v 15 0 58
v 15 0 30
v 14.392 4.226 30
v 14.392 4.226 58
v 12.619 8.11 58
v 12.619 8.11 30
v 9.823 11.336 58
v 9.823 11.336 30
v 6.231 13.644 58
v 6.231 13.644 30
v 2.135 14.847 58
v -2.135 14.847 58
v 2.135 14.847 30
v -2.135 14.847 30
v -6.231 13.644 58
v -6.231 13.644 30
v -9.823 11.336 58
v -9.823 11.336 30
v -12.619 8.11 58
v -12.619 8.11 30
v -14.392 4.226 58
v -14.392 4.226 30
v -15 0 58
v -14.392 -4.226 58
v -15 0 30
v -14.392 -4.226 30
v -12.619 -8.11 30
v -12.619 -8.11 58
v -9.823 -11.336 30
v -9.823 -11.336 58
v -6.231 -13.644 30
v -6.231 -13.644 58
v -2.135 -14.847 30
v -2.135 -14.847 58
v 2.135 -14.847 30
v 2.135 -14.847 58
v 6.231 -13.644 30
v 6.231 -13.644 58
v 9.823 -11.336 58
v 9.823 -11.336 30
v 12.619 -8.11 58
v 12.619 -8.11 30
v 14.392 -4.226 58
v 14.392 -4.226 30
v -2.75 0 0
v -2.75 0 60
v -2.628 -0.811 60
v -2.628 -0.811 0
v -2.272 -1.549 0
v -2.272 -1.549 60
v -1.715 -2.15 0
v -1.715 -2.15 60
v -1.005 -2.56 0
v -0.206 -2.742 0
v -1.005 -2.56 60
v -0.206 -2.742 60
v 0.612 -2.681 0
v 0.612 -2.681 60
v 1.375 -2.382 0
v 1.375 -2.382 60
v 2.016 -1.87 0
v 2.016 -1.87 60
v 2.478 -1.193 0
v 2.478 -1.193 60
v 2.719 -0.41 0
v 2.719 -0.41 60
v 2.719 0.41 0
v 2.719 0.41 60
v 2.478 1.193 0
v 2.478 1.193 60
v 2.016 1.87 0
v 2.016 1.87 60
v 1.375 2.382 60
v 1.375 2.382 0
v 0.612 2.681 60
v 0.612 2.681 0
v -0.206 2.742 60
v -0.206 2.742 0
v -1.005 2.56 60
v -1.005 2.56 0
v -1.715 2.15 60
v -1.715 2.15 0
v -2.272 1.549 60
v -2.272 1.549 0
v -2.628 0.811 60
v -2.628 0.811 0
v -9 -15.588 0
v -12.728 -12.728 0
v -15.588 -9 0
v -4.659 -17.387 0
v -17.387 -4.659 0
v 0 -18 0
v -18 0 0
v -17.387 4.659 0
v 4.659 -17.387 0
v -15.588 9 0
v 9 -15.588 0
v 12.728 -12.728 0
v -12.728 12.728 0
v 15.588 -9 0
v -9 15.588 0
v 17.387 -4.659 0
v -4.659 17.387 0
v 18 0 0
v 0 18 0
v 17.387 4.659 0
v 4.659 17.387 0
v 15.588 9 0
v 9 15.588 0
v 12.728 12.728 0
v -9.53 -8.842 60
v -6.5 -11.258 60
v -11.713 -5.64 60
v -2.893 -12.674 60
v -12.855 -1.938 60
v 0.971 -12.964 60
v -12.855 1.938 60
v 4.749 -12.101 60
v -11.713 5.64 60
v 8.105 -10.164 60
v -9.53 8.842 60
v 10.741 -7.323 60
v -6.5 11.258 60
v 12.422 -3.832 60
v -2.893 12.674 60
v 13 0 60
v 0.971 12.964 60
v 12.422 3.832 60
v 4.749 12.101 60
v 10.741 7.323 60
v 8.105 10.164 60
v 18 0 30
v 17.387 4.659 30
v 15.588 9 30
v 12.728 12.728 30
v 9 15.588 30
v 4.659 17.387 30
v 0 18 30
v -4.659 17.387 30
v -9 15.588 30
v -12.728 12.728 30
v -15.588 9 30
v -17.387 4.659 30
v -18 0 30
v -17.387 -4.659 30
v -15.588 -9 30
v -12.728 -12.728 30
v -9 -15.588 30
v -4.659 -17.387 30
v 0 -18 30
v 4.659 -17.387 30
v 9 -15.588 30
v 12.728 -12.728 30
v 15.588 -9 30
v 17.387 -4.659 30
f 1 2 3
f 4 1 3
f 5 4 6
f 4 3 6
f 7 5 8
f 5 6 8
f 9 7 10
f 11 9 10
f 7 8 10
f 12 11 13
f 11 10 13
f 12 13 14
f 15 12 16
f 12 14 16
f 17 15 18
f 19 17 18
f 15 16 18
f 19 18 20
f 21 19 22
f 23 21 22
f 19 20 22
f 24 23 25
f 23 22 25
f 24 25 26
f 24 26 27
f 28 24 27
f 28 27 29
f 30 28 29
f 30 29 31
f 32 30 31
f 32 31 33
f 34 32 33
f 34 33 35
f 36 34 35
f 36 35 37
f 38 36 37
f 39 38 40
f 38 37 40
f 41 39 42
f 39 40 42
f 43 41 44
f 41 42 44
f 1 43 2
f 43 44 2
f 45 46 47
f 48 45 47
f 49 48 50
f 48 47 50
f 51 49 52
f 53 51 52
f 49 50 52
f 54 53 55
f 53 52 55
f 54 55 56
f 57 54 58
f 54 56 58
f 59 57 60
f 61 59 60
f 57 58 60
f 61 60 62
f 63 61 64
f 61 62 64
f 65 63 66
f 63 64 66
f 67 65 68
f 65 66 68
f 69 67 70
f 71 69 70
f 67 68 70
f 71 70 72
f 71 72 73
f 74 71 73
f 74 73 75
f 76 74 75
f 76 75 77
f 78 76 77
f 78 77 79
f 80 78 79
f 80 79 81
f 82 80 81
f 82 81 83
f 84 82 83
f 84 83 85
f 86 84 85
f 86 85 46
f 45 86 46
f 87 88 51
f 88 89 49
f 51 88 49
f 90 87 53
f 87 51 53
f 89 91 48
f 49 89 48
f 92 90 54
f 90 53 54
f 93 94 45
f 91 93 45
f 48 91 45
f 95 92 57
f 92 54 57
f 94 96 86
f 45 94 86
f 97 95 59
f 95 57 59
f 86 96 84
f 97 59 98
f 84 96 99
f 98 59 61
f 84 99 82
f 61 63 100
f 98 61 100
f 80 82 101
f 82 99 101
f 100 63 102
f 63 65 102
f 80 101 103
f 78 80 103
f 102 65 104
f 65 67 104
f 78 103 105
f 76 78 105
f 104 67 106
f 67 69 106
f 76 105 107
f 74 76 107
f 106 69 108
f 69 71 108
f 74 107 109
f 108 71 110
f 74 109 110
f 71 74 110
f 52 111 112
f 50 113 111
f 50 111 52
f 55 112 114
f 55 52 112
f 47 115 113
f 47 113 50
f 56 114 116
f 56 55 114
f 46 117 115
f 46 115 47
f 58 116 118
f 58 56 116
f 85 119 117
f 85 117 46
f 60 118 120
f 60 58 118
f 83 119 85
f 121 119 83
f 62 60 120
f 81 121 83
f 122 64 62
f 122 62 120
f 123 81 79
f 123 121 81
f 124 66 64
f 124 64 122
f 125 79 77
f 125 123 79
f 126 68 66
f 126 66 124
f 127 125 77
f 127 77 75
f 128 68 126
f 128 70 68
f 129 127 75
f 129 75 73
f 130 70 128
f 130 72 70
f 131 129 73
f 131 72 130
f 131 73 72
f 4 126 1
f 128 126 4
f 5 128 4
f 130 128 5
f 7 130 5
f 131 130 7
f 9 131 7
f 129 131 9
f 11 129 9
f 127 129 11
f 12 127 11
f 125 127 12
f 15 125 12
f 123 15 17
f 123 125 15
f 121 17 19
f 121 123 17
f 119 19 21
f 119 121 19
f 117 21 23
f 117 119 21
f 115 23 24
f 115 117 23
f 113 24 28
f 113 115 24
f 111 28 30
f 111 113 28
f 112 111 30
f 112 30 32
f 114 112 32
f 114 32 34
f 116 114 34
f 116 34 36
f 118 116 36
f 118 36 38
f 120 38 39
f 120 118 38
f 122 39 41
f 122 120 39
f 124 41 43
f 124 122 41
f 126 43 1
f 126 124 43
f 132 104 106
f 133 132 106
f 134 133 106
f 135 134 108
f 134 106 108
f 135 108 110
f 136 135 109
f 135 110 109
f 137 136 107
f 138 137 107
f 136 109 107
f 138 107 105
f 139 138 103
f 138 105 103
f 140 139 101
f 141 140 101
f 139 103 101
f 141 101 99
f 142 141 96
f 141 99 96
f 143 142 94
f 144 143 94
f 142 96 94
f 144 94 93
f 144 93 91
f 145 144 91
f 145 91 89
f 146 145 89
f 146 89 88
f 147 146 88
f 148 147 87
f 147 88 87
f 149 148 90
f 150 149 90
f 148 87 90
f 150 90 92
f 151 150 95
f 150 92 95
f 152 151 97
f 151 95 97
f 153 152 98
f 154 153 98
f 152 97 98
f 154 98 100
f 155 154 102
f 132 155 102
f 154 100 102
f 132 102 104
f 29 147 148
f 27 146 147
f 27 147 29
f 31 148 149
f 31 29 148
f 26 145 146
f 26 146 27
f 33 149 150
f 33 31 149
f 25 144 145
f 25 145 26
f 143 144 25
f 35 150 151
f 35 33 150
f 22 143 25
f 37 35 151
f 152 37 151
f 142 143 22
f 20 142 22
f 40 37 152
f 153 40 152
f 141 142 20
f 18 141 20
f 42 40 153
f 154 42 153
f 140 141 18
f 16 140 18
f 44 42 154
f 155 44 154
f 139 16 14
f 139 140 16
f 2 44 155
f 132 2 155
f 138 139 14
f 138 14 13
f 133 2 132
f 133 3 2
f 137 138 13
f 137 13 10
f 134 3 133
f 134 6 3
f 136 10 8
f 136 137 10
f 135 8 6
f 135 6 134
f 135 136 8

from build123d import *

# Parameters (mm, degrees)
F0_R     = 18
F1_DEPTH = 30
F2_R     = 15
F3_DEPTH = 30
F5_D     = 5.5
F6_SIZE  = 2


with BuildPart() as f1:
    # F0 (on Top) → F1 (new body)
    with BuildSketch(Plane.XY):
        Circle(F0_R)
    extrude(amount=F1_DEPTH)

    # F2 (on face) → F3 (join)
    with BuildSketch(Plane.XY.offset(30)):
        Circle(F2_R)
    extrude(amount=F3_DEPTH)

    # F5 (through all)
    with Locations(Plane(origin=(0, 0, 0), x_dir=(1, 0, 0), z_dir=(0, 0, -1))):
        with Locations((0, 0)):
            Hole(F5_D / 2)

    # F6
    f6_edges = [f1.edges().sort_by_distance(p)[0] for p in [
        (-15, 0, 60),
    ]]
    chamfer(f6_edges, length=F6_SIZE)


solid = f1.part
